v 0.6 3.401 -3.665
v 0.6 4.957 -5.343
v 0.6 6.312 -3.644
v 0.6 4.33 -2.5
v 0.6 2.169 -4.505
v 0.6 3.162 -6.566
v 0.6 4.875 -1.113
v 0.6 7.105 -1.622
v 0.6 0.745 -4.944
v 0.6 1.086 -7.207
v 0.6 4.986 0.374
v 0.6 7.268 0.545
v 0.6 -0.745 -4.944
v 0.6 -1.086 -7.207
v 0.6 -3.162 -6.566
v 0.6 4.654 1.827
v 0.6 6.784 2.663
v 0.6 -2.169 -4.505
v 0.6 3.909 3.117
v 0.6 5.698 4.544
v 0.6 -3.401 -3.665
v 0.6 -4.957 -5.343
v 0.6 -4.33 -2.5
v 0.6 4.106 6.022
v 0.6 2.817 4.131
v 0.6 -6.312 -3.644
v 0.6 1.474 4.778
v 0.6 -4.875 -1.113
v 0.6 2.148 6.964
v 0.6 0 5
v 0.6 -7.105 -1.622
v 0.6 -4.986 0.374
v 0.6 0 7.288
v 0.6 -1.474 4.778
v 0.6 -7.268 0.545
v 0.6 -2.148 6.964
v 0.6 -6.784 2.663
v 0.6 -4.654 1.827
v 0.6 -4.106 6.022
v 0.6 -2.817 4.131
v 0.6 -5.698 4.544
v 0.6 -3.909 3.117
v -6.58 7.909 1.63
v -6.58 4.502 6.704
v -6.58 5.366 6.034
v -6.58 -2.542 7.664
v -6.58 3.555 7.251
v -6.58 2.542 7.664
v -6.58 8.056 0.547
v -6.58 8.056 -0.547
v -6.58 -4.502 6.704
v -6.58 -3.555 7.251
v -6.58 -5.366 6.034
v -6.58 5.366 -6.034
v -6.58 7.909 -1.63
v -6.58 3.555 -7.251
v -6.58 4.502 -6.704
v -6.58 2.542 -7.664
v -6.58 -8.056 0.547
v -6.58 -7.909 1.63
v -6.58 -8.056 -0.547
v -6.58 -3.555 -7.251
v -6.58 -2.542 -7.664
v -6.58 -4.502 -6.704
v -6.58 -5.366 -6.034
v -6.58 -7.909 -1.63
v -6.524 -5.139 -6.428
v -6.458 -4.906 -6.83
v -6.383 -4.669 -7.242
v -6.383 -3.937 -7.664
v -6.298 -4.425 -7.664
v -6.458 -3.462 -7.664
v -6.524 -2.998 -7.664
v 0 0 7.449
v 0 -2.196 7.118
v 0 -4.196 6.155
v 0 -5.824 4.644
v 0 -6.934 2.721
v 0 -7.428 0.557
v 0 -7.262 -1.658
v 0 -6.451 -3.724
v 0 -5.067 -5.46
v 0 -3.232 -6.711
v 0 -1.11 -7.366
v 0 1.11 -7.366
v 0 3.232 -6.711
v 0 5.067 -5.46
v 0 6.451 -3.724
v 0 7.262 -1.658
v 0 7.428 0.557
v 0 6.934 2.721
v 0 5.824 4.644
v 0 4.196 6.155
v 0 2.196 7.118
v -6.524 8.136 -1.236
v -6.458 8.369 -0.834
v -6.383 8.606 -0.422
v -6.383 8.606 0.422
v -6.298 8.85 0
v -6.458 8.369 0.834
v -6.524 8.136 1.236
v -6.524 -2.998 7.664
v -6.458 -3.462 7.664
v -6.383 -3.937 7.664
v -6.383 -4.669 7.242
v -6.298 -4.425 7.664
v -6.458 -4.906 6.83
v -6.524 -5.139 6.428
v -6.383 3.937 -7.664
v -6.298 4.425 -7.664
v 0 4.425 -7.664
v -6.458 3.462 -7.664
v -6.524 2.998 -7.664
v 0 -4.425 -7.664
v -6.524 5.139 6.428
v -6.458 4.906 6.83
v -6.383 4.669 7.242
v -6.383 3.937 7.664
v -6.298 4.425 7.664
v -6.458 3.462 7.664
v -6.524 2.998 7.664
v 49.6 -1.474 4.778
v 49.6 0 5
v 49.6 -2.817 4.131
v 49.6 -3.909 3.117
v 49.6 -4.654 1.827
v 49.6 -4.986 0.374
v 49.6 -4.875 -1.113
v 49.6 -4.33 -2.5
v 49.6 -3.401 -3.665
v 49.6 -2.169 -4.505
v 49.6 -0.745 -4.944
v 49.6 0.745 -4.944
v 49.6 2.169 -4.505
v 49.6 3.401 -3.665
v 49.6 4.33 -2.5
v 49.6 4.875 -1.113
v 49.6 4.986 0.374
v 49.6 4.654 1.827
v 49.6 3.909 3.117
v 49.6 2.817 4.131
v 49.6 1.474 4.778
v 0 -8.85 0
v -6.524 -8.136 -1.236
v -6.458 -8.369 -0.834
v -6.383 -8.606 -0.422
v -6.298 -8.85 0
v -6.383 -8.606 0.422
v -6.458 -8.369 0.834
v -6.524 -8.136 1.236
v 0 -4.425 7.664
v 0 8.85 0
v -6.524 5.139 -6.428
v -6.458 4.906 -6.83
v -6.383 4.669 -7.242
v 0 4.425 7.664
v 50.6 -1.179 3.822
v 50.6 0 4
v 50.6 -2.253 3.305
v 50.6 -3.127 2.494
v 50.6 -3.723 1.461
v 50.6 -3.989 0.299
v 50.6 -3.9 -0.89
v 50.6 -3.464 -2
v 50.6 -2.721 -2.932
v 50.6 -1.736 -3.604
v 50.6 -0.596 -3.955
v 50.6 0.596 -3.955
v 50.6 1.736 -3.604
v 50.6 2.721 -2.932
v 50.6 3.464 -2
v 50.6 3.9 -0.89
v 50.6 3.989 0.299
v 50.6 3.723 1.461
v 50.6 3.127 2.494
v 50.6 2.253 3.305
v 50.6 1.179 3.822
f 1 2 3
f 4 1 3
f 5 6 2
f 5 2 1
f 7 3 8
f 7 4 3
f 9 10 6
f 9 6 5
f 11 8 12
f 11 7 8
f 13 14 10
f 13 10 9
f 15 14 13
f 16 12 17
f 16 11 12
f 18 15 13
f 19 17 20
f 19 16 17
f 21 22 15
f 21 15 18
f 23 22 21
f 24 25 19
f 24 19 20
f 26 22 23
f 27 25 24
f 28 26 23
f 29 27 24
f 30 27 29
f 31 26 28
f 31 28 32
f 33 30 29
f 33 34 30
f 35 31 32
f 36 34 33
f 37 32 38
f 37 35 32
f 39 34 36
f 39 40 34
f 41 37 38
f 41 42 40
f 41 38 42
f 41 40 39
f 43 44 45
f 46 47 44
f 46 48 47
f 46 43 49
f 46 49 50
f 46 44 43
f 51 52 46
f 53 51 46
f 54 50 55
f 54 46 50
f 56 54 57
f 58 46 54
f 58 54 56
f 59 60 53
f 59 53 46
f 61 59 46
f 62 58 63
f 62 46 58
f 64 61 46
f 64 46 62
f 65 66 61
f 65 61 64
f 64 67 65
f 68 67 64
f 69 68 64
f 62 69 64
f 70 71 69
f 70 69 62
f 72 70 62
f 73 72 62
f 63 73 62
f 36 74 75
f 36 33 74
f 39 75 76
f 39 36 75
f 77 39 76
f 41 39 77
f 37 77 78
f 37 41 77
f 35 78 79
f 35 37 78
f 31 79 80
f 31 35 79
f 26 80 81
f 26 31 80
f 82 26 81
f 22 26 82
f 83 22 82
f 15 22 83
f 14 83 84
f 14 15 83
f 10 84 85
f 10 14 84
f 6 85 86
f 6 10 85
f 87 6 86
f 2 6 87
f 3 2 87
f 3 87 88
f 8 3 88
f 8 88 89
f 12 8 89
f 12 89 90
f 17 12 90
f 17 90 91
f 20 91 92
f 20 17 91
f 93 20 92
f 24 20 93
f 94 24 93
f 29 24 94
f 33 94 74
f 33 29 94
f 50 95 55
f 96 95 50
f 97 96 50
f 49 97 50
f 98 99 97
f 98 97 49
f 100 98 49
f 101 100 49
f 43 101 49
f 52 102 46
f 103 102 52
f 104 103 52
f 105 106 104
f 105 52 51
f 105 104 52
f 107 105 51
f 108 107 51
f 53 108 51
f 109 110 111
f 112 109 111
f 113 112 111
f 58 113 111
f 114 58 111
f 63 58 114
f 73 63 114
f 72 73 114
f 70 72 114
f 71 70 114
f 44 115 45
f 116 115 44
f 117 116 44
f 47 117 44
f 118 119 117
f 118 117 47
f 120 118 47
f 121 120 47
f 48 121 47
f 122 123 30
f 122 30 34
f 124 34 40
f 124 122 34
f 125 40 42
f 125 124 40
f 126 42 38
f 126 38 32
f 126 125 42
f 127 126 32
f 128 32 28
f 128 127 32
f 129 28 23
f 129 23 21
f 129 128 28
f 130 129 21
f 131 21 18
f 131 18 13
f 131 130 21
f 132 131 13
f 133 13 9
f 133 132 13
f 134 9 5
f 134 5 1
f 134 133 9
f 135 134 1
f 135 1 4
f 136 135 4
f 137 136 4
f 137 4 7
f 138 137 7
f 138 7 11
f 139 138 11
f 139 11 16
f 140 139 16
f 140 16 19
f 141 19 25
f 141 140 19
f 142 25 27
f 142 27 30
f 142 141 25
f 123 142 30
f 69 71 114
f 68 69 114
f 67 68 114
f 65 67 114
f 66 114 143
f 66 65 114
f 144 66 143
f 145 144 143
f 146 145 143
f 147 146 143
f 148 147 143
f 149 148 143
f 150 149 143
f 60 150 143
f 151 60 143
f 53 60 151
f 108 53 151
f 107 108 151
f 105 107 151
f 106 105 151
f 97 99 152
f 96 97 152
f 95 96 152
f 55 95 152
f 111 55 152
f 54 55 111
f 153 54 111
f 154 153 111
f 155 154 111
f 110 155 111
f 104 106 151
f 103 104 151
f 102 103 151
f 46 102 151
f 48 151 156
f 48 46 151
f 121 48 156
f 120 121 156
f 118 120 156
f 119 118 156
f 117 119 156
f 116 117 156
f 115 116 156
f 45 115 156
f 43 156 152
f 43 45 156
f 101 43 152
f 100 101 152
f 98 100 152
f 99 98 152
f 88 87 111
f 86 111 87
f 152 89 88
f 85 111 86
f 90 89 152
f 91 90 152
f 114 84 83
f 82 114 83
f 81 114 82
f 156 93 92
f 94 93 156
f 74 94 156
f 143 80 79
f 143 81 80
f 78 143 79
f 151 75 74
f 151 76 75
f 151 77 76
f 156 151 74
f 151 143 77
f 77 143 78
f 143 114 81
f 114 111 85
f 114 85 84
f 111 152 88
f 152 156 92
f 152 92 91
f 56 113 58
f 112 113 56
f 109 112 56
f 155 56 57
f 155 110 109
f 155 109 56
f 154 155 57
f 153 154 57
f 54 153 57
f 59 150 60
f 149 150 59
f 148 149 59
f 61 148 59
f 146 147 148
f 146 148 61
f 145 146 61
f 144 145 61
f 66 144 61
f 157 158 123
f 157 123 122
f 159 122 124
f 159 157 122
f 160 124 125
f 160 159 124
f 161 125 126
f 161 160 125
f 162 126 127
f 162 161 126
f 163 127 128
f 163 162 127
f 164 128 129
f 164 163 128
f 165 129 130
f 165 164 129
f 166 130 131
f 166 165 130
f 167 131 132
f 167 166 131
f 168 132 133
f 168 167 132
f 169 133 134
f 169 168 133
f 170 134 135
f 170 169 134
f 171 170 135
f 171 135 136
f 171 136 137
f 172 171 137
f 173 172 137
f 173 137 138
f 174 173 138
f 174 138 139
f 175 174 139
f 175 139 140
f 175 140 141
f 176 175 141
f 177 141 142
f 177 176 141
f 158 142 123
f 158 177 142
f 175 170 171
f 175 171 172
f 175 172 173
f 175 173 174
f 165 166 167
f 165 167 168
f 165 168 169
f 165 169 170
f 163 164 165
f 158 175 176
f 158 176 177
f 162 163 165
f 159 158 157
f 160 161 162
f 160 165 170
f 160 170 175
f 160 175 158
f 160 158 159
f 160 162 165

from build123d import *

# Parameters (mm, degrees)
SKETCH_2_OUTSIDE_W  = 32.184
SKETCH_2_OUTSIDE_H  = 32.184
CUT_EXTRUDE_1_DEPTH = 59.533728738
CHAMFER_1_SIZE      = 1


with BuildPart() as part:
    # Эскиз1 → Повернуть1 (revolve)
    with BuildSketch(Plane.XY, mode=Mode.PRIVATE) as revolve_1_sk:
        Polygon((-6.58, 0), (-6.58, 8.85), (0, 8.85), (0, 7.448974596), (0.6, 7.288205081), (0.6, 5), (50.6, 5), (50.6, 0), align=None)
    revolve(revolve_1_sk.sketch.rotate(Axis((-1000, 0, 0), (1, 0, 0)), 90), axis=Axis((-1000, 0, 0), (1, 0, 0)))

    # Эскиз2 outside → Вырез-Вытянуть1 (cut, through all)
    with BuildSketch(Plane.ZY.offset(6.58)):
        Rectangle(SKETCH_2_OUTSIDE_W, SKETCH_2_OUTSIDE_H)
        Polygon((0, -8.85), (7.664324823, -4.425), (7.664324823, 4.425), (0, 8.85), (-7.664324823, 4.425), (-7.664324823, -4.425), align=None, mode=Mode.SUBTRACT)
    extrude(amount=-CUT_EXTRUDE_1_DEPTH, mode=Mode.SUBTRACT)

    # Эскиз4 → Вырез-Повернуть1 (revolve, cut)
    with BuildSketch(Plane.XY):
        Polygon((-6.58, 8.075), (-6.297923068, 8.85), (-6.58, 8.85), align=None)
    revolve(axis=Axis((-1000, 0, 0), (1, 0, 0)), mode=Mode.SUBTRACT)

    # Фаска1
    chamfer_1_edges = [part.edges().sort_by_distance(p)[0] for p in [
        (50.6, 0, -5),
    ]]
    chamfer(chamfer_1_edges, length=CHAMFER_1_SIZE)


solid = part.part
